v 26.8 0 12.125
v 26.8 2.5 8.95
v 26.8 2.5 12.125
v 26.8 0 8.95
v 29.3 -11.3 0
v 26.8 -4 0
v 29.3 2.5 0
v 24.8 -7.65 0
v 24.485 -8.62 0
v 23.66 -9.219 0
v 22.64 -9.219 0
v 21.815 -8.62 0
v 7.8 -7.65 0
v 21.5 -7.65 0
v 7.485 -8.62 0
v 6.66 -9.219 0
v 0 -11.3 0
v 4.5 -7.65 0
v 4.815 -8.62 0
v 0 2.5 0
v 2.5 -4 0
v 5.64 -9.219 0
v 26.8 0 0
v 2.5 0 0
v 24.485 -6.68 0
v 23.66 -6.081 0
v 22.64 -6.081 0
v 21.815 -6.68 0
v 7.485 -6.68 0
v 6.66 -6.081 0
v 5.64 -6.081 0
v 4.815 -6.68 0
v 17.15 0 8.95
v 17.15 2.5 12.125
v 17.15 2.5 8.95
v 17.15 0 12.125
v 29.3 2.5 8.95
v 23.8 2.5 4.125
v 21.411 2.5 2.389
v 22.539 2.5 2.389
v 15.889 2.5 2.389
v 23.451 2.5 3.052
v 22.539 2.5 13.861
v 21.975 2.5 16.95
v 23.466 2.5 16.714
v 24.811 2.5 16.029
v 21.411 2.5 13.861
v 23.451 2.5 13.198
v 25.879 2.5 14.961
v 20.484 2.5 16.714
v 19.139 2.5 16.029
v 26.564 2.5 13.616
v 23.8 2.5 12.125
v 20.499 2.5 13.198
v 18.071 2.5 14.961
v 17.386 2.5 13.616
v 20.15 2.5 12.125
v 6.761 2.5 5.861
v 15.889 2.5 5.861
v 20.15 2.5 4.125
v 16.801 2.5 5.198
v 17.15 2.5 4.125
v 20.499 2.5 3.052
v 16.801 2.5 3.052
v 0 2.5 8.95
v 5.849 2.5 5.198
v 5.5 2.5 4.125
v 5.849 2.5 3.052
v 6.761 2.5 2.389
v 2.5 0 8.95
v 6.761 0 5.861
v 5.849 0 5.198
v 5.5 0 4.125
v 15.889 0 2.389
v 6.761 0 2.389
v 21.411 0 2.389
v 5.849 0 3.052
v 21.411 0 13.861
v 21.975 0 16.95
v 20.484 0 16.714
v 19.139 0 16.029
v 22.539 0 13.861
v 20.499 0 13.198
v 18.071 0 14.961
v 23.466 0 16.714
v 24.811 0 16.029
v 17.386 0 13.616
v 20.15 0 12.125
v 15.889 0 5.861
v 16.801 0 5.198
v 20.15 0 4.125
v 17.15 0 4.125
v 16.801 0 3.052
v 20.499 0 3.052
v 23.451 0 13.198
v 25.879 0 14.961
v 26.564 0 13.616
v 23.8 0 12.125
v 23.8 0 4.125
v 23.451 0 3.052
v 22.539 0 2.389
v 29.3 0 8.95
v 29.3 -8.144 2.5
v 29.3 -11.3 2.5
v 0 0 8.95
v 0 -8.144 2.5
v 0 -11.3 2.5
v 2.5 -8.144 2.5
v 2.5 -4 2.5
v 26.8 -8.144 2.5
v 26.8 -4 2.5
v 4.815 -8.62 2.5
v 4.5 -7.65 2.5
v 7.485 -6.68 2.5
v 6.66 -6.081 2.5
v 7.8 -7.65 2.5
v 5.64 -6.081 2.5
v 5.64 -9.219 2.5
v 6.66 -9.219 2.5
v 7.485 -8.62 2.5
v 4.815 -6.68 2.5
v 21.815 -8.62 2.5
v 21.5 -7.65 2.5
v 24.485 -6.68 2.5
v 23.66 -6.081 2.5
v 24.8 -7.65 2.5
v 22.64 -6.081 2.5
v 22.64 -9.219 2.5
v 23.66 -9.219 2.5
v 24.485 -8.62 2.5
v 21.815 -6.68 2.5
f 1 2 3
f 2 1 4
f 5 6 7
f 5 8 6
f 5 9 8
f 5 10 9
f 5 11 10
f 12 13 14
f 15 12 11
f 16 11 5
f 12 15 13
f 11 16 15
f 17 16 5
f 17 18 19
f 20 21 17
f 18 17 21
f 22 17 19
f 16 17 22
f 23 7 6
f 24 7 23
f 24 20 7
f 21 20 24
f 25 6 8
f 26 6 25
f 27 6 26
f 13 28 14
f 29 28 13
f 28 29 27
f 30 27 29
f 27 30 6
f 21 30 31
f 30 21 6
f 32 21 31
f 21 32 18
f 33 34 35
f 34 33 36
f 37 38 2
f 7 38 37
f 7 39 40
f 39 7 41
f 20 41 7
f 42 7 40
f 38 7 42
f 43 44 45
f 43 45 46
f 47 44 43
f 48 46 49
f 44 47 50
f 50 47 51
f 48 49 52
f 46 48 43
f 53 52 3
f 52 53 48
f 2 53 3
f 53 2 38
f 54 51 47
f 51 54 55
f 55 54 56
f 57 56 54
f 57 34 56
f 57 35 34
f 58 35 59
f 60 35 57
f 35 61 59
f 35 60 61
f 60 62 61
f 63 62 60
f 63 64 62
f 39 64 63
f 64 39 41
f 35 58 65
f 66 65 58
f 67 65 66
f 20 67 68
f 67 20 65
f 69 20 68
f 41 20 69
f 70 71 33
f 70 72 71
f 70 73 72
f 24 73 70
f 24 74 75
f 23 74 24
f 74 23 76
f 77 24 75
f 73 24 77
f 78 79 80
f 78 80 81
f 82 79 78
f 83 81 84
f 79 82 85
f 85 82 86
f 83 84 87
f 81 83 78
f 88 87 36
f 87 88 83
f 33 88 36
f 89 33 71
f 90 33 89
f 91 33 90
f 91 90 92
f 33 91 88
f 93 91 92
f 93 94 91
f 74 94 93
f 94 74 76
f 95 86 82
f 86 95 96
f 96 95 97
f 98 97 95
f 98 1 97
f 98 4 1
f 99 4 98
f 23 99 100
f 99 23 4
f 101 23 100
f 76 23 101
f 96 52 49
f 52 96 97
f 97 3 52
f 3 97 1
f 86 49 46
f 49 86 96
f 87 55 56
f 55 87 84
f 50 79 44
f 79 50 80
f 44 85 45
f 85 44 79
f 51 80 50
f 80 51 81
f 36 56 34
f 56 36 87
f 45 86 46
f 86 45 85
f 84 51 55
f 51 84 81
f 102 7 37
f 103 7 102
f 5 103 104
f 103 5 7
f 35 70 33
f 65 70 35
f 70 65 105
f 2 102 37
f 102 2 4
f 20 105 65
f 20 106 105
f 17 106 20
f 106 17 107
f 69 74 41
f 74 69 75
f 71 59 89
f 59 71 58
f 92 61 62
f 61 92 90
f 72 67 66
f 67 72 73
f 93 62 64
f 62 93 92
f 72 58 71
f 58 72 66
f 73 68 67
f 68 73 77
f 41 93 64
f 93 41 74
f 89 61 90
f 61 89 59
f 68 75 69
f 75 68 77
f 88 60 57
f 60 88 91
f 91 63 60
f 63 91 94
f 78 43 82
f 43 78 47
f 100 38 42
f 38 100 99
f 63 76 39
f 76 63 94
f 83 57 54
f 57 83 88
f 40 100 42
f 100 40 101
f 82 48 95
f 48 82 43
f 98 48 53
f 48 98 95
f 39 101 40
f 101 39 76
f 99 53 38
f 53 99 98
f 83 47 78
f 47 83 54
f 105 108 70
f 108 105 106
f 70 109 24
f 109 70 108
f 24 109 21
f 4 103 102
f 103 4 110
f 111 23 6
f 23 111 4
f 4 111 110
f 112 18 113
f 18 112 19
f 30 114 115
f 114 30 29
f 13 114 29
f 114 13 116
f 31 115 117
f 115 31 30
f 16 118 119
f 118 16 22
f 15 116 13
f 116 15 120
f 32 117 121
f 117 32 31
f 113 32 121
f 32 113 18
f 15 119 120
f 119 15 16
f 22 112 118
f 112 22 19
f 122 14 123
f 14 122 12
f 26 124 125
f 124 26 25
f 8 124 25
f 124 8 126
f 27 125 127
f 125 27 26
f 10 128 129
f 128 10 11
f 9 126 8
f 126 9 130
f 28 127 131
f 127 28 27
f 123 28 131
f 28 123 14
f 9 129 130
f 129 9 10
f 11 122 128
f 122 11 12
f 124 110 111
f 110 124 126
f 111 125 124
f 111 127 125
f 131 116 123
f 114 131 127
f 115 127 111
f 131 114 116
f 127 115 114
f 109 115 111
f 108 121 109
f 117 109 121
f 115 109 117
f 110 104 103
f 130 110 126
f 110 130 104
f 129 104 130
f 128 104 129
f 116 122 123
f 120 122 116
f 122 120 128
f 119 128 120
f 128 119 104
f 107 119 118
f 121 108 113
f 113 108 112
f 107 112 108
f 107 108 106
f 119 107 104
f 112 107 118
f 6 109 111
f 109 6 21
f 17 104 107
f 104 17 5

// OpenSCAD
// Number of Slots
slotConfig = 3;  // 0, 1, 2, 3

// Thickness of the base portion of the bracket
baseDepth = 2.5;

// Diameter of base holes
baseDiameter = 3.3; 

// Distance between holes and edge
baseAllowance = 2;

// Space between inner surface of bracket platform and side of mounting platform. 
baseDistance = 4;

// Slot instead of double holes?
baseSlot = false; // true, false

// Thickness of the slot portion of the bracket.
slotDepth = 2.5; 

// Vertical Length of Slot
vSlotLength = 8;  

// Horizontal Length of Slot
hSlotLength = 8;

// Diameter of slot holes
slotDiameter = 3.65;

// Minimum distance between slot side and any edge/obstruction
slotAllowance = 3;

// The height off of the bottom of the bracket that the hole starts. Measured from bottom of hole. 
slotHeight = 2.3;

// Width of triangular prisms that hold the base to the bracket
supportWidth = 2.5; 

// Change to true if you would like the vertical slot on the other side (Only for slotConfig = 3)
bracketMirror = false;  // true, false

//////// Do not edit any of these variables ////////

baseLength = 
[2*supportWidth+2*slotAllowance+slotDiameter, // slotConfig = 0
2*supportWidth+2*slotAllowance+slotDiameter+hSlotLength, // slotConfig = 1
2*supportWidth+2*slotAllowance+slotDiameter, // slotConfig = 2
2*supportWidth+3*slotAllowance+2*slotDiameter+hSlotLength // slotConfig = 3
];

transVal = [supportWidth+slotAllowance+slotDiameter/2, 0, supportWidth, baseLength[slotConfig]-(2*slotAllowance+slotDiameter)-supportWidth]; // Why can't I assign variable values in IF statements?

polyPoi = 
[[0, 0, slotHeight+slotDiameter+slotAllowance], 
[supportWidth, 0, slotHeight+slotDiameter+slotAllowance], 
[supportWidth, 0, 0], 
[0, 0, 0], 
[0, -(baseDistance+2*baseAllowance+baseDiameter), 0], 
[supportWidth, -(baseDistance+2*baseAllowance+baseDiameter), 0]];

polyTri = [[0,3,2], [0,2,1],  [3,0,4], [1,2,5], [0,5,4], [0,1,5],  [5,2,4], [4,2,3], ]; // Thank you OpenSCAD User Manual! <3

//////////////////

module bracketMount(){
	module hSlotPositive(){
		if (slotConfig == 0){
			cube([baseLength[slotConfig],slotDepth,slotHeight+slotDiameter+slotAllowance]);
		}
		if (slotConfig != 0 && slotConfig != 2){
			cube([baseLength[slotConfig],slotDepth,slotHeight+slotDiameter+slotAllowance]);
		} // Well that was boring
		if (slotConfig != 0 && slotConfig != 1){
			translate([transVal[slotConfig], 0, 0]) union(){
				cube([2*slotAllowance+slotDiameter, slotDepth, slotHeight+slotDiameter/2+vSlotLength]);
				translate([slotAllowance+slotDiameter/2,slotDepth,slotHeight+slotDiameter/2+vSlotLength])
					rotate([90,0,0])
						cylinder(r=(slotAllowance+slotDiameter/2), h=slotDepth, $fn=20);
			}
			cube([baseLength[slotConfig],slotDepth,slotHeight+slotDiameter+slotAllowance]);
		} // If I said this unit wasn't partially guessing stuff I would be lying
	}
	module hSlotNegative(){
		if (slotConfig == 0){
			translate([transVal[slotConfig],slotDepth+1,slotHeight+slotDiameter/2])
			rotate([90,0,0]) 
				cylinder(r=slotDiameter/2, h=slotDepth+2, $fn=10);
		}
		if (slotConfig != 0 && slotConfig != 2){
			translate([slotAllowance+supportWidth+slotDiameter/2,slotDepth+1,slotHeight+slotDiameter/2])
			rotate([90,0,0]) 
				hull(){
					cylinder(r=slotDiameter/2, h=slotDepth+2, $fn=10);
					translate([hSlotLength,0,0])
						cylinder(r=slotDiameter/2, h=slotDepth+2, $fn=10);
				} // Hooray hulls! Making my life that much easier.
		}
		if (slotConfig != 0 && slotConfig != 1){
			translate([transVal[slotConfig]+slotAllowance+slotDiameter/2,slotDepth+1,slotHeight+slotDiameter/2])
			rotate([90,0,0]) 
				hull(){
					cylinder(r=slotDiameter/2, h=slotDepth+2, $fn=10);
					translate([0,vSlotLength,0])
						cylinder(r=slotDiameter/2, h=slotDepth+2, $fn=10);
				}
		}
	}
	difference(){
		hSlotPositive();
		hSlotNegative();
	}
}

module triangularSupport(){
polyhedron (points = polyPoi, triangles = polyTri);
translate([baseLength[slotConfig]-supportWidth,0,0])
	polyhedron (points = polyPoi, triangles = polyTri);
}

module baseMount(){
	module positiveBase(){
		translate([0,-baseDistance,0]) mirror([0,1,0])
			cube([baseLength[slotConfig], 2*baseAllowance+baseDiameter, baseDepth]);
	}
	module negativeBase(){
		if (baseSlot){
			translate([baseAllowance+supportWidth+baseDiameter/2,-baseDistance-baseAllowance-baseDiameter/2,-1]) hull(){
				cylinder(r=baseDiameter/2, h=baseDepth+2, $fn=10);
				translate([baseLength[slotConfig]-2*baseAllowance-2*supportWidth-baseDiameter,0,0])
					cylinder(r=baseDiameter/2, h=baseDepth+2, $fn=10);
			}
		} else {
			translate([baseAllowance+supportWidth+baseDiameter/2,-baseDistance-baseAllowance-baseDiameter/2,-1]) union(){
				cylinder(r=baseDiameter/2, h=baseDepth+2, $fn=10);
				translate([baseLength[slotConfig]-2*baseAllowance-2*supportWidth-baseDiameter,0,0])
					cylinder(r=baseDiameter/2, h=baseDepth+2, $fn=10);
			}
		}
	}
	difference(){
		positiveBase();
		negativeBase();
	}
}

if (bracketMirror){
mirror([1,0,0]){
bracketMount();
triangularSupport();
baseMount();
}
} else {
bracketMount();
triangularSupport();
baseMount();
}
